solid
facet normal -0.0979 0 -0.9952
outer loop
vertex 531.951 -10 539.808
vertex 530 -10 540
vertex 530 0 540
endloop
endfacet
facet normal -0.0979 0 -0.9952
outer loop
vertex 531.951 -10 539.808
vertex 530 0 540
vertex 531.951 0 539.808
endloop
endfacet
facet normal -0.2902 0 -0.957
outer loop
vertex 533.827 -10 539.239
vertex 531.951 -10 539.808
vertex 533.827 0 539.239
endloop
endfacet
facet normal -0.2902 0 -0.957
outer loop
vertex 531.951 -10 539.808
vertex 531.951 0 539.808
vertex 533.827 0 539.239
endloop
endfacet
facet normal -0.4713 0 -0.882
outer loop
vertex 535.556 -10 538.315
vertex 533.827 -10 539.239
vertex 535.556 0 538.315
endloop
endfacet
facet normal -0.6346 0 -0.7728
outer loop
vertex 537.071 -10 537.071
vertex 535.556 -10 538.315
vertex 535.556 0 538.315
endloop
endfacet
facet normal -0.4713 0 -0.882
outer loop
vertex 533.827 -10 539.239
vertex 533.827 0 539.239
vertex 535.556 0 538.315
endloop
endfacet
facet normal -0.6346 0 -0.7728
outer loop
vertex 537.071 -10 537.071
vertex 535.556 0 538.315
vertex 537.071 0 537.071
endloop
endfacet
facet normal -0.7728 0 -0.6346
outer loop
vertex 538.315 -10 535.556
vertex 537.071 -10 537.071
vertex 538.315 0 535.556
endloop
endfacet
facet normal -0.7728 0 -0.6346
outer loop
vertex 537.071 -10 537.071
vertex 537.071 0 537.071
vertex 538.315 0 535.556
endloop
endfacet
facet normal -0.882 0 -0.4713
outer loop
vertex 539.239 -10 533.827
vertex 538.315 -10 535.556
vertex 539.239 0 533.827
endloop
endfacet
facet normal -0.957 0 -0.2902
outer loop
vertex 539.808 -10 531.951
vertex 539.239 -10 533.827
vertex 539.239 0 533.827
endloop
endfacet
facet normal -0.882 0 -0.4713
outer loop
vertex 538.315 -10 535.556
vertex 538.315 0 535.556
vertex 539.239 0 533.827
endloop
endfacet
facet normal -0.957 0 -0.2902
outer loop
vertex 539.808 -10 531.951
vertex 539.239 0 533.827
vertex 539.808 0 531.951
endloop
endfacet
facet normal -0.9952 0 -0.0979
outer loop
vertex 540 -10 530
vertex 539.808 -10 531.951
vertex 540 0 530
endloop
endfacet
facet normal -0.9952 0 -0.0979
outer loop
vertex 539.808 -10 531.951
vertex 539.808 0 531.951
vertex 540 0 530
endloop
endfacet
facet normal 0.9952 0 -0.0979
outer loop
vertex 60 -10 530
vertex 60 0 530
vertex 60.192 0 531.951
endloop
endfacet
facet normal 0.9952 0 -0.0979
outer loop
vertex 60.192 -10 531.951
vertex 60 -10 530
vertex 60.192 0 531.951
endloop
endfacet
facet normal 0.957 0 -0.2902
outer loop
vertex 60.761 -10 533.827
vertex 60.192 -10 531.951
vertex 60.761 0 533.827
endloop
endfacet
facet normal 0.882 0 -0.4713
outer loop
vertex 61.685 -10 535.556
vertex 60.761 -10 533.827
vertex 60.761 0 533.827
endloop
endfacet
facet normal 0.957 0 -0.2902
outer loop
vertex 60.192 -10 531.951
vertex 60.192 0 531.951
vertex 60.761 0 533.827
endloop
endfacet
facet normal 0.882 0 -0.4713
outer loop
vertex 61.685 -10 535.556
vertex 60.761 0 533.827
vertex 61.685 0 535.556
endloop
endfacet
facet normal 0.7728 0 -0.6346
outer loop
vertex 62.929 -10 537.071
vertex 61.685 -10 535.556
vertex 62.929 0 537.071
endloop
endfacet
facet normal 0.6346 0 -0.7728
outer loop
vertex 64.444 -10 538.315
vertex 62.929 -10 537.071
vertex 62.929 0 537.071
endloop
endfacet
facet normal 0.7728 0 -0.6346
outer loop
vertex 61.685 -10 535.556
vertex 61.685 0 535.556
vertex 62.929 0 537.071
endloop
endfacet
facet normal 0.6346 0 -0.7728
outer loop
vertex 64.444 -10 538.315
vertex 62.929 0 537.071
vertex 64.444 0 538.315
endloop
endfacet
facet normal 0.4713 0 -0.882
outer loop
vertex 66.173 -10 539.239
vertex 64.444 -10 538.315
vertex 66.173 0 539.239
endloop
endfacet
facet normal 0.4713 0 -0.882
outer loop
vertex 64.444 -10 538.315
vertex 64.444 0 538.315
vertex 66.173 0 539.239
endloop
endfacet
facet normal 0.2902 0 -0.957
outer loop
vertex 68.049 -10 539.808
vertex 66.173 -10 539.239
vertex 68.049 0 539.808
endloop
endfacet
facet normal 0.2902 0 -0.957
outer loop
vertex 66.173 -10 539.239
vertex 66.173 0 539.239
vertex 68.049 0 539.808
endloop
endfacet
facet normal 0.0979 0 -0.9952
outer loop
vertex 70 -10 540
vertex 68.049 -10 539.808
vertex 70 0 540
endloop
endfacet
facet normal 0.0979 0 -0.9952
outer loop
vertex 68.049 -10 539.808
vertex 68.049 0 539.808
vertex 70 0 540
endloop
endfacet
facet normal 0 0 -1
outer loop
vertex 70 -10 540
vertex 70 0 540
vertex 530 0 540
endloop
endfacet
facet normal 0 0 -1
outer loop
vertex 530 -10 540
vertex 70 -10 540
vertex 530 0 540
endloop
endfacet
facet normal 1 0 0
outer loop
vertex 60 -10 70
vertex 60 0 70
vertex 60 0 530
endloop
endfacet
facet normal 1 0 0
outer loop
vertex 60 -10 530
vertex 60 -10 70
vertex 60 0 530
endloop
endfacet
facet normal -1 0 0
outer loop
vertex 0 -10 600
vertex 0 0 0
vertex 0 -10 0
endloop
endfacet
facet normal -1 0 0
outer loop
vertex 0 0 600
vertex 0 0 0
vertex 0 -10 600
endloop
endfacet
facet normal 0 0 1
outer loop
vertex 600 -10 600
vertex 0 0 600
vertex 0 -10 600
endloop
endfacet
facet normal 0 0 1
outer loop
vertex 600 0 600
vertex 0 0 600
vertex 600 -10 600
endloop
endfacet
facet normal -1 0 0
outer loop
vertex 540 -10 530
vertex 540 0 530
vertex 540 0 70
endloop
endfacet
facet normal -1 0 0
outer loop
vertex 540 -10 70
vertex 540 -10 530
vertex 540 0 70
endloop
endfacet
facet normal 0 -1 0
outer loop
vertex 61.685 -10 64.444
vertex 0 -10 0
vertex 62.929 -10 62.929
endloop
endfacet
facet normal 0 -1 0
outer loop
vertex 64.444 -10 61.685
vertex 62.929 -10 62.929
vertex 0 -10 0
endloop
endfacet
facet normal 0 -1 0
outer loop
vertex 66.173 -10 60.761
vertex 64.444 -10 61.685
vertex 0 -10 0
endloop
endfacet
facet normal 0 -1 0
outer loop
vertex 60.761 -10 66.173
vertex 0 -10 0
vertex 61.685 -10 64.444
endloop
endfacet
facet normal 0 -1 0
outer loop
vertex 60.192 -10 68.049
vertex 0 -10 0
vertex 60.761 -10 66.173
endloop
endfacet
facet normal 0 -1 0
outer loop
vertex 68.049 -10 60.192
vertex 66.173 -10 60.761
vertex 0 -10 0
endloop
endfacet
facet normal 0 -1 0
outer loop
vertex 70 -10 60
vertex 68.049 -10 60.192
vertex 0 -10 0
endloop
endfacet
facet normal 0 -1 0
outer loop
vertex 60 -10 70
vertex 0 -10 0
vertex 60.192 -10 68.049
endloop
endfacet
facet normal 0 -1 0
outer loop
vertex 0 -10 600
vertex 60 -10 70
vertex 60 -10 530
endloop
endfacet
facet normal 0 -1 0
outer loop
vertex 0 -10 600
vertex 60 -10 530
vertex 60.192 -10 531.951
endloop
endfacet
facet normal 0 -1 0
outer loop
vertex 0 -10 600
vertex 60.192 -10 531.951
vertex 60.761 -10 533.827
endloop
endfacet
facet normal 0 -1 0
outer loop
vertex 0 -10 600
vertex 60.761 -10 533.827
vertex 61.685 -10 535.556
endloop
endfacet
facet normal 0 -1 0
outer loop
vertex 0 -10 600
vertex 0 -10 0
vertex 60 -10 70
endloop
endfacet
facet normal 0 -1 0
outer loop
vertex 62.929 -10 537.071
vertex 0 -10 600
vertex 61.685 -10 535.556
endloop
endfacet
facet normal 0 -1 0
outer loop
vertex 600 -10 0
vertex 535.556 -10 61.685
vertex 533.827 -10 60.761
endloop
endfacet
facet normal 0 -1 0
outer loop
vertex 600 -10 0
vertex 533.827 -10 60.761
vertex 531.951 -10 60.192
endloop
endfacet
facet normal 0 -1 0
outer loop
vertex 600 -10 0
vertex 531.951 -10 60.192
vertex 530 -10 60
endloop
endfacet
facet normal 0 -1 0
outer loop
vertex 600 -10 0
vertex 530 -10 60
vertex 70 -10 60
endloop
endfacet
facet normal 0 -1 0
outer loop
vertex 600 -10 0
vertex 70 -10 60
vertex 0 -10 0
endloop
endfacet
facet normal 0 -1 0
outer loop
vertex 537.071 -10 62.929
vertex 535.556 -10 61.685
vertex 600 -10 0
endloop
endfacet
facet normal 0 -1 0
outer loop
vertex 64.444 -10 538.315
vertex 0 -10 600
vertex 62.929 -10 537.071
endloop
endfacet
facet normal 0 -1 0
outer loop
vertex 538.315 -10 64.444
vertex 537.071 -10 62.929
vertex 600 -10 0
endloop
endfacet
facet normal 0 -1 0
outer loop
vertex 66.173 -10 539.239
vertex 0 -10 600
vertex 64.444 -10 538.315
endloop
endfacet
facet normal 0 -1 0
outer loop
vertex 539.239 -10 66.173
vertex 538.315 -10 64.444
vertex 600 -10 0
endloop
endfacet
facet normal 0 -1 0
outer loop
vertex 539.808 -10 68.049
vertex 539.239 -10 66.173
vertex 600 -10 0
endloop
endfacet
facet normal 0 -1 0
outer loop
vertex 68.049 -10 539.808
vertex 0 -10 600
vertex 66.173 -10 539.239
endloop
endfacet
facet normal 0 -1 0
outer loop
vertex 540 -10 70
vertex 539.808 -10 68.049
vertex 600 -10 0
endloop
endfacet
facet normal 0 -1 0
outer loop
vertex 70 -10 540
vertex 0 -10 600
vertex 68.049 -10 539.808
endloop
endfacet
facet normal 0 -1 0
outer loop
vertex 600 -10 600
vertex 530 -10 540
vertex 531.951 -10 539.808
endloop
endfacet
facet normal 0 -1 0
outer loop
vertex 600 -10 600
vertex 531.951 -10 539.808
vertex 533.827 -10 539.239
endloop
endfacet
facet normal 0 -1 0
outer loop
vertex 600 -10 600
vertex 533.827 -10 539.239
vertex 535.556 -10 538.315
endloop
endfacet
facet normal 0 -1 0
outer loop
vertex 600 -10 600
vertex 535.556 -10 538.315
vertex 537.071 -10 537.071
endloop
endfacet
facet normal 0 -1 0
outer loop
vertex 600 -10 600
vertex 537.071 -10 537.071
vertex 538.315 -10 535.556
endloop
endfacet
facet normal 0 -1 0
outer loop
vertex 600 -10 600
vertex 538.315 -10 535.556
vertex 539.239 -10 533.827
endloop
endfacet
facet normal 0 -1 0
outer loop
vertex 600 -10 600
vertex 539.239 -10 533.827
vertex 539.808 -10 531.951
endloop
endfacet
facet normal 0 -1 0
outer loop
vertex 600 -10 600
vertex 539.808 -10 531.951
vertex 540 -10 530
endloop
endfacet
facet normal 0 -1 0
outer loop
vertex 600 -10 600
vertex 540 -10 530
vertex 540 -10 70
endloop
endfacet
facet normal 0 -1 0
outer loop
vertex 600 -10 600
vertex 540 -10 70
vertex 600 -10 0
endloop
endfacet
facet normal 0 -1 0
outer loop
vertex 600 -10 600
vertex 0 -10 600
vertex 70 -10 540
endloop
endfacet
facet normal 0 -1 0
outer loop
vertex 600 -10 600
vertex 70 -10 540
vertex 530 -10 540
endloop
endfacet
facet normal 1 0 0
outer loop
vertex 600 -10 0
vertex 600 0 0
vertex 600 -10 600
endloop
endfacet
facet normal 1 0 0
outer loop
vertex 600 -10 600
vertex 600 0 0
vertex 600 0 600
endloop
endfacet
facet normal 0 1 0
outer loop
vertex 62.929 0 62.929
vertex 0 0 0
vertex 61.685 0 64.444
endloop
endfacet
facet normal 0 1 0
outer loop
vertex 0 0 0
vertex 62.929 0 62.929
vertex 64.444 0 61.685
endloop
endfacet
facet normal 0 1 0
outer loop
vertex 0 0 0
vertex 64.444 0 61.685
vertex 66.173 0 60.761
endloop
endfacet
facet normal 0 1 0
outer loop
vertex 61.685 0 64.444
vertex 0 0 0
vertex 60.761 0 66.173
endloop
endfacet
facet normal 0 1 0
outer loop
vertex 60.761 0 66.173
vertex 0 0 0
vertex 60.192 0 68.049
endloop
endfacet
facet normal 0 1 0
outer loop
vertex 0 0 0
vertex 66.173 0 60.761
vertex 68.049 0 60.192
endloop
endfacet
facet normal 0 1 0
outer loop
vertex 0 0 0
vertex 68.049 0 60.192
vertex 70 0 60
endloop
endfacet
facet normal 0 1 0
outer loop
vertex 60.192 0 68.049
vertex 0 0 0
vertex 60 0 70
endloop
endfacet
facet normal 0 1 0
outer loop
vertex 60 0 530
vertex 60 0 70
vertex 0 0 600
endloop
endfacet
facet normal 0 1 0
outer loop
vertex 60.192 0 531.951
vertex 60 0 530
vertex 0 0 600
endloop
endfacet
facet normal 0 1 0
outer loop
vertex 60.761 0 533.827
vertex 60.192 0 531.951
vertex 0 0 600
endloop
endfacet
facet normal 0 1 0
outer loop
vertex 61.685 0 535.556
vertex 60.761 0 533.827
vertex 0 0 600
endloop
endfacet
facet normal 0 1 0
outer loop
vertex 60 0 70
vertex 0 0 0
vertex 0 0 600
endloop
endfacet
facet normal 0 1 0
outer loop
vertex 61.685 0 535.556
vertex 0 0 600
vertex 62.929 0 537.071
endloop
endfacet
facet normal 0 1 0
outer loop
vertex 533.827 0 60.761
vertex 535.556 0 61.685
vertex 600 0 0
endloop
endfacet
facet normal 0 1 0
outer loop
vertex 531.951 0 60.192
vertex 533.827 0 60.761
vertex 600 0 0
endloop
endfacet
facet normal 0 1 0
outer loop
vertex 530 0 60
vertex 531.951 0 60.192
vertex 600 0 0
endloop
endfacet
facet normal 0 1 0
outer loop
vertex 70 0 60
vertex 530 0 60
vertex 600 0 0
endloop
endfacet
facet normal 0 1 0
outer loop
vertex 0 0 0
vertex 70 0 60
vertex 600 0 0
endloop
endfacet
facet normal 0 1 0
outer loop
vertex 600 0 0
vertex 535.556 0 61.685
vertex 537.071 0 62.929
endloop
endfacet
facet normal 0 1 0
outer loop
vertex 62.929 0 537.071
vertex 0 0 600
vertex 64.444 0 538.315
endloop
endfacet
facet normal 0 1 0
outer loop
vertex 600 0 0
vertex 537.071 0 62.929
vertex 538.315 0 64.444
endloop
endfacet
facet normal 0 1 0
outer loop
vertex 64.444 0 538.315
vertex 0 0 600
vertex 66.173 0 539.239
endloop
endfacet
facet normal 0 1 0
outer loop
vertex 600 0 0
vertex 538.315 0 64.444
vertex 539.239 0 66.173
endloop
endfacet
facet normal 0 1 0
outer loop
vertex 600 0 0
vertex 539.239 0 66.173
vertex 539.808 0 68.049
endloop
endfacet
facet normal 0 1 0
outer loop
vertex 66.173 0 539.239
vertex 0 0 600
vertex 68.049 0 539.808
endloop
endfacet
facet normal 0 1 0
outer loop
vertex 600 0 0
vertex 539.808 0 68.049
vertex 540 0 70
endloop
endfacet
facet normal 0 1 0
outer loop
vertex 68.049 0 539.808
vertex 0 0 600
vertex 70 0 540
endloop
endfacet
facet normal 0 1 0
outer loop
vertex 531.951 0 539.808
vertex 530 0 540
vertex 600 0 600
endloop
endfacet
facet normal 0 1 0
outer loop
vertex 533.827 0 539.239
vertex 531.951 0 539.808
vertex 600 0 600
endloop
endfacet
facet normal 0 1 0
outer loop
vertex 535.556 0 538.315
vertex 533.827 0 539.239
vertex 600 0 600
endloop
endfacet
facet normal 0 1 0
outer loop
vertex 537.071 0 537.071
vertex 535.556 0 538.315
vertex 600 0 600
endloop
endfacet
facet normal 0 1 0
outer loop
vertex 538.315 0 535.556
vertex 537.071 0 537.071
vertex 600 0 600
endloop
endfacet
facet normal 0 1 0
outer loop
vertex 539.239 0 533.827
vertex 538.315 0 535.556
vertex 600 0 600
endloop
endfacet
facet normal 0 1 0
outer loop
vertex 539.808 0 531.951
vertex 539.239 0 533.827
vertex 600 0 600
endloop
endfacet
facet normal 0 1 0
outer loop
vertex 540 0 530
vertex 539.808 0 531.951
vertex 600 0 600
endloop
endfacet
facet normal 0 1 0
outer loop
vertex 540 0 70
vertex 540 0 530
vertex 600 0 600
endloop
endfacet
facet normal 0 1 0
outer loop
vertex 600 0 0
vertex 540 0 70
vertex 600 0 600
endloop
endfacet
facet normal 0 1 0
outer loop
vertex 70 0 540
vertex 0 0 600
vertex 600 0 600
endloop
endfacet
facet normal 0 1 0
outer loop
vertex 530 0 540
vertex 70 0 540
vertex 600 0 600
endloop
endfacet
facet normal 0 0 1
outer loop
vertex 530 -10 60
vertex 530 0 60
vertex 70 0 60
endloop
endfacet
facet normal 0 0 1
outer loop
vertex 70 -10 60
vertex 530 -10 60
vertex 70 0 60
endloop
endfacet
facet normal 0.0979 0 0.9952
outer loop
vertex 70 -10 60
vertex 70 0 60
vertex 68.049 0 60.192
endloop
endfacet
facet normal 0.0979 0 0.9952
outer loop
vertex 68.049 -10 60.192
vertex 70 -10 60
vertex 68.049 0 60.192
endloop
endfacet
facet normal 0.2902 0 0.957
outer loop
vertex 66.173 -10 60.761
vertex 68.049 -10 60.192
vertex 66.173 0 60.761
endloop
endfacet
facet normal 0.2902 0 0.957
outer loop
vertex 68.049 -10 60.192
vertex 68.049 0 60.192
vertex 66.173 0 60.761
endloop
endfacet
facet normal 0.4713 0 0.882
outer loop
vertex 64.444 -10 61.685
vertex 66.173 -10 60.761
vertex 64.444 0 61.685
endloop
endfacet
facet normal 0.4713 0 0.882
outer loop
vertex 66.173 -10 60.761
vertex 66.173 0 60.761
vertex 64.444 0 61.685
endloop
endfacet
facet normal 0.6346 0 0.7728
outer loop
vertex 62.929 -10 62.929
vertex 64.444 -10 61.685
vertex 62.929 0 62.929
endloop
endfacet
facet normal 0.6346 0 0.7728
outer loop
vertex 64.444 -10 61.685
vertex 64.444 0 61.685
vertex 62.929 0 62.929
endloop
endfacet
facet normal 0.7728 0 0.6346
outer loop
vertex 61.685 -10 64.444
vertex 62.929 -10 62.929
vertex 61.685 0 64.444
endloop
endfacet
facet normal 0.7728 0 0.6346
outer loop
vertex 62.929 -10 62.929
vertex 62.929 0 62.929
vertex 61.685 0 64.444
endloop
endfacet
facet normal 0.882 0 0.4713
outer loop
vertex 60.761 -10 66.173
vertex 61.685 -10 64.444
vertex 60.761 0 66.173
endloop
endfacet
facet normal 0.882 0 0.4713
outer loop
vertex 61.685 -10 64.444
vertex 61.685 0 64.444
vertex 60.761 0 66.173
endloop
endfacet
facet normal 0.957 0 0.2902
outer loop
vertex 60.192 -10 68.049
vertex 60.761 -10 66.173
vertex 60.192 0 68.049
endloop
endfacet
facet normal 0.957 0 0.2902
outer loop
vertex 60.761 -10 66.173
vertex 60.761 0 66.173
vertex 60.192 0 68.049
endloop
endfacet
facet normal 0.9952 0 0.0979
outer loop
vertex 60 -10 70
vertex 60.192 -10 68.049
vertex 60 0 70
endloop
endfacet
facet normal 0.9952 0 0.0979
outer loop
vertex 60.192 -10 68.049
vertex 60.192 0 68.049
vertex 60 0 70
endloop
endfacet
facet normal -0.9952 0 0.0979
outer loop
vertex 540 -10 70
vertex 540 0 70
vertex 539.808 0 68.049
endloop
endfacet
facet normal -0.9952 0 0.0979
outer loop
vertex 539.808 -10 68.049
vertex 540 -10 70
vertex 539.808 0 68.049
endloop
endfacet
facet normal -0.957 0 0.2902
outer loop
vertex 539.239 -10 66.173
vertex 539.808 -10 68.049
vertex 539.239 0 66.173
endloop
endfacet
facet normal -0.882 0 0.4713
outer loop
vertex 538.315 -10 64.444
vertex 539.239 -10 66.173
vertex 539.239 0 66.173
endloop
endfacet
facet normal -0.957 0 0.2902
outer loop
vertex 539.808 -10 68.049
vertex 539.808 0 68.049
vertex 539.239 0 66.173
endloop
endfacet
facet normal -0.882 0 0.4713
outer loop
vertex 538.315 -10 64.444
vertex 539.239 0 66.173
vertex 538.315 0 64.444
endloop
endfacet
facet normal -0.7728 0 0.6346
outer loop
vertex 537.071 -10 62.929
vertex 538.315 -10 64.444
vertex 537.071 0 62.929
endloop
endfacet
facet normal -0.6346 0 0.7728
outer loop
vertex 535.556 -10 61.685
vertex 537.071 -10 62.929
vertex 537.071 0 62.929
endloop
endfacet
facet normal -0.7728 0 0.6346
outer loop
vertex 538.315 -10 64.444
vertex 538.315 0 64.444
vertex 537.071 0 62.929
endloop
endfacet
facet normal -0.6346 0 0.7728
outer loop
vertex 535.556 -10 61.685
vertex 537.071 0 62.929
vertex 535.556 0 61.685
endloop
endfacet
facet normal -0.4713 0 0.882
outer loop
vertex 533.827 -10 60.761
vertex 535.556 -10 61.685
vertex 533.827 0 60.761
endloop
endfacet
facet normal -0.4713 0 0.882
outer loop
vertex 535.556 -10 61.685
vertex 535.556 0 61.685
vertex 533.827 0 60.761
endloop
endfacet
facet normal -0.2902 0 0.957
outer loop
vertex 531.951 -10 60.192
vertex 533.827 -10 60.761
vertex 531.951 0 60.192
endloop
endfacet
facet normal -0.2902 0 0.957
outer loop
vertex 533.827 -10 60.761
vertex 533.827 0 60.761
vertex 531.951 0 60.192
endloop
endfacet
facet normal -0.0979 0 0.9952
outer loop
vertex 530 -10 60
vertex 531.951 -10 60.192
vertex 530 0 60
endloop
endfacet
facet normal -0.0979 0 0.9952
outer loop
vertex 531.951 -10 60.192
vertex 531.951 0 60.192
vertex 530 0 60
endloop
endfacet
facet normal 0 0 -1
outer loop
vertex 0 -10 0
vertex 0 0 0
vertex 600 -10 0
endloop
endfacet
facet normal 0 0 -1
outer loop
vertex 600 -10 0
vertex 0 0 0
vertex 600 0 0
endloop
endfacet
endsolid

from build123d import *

# Parameters (mm, degrees)
F0_W     = 600
F0_H     = 600
F1_DEPTH = 10


with BuildPart() as f1:
    # F0 (on Front) → F1 (new body)
    with BuildSketch(Plane.XZ):
        with Locations((300, 300)):
            Rectangle(F0_W, F0_H)
        with BuildLine():
            ThreePointArc((60, 530), (62.928932, 537.071068), (70, 540))
            Line((70, 540), (530, 540))
            ThreePointArc((530, 540), (537.071068, 537.071068), (540, 530))
            Line((540, 530), (540, 70))
            ThreePointArc((540, 70), (537.071068, 62.928932), (530, 60))
            Line((530, 60), (70, 60))
            ThreePointArc((70, 60), (62.928932, 62.928932), (60, 70))
            Line((60, 70), (60, 530))
        make_face(mode=Mode.SUBTRACT)
    extrude(amount=F1_DEPTH)


solid = f1.part
